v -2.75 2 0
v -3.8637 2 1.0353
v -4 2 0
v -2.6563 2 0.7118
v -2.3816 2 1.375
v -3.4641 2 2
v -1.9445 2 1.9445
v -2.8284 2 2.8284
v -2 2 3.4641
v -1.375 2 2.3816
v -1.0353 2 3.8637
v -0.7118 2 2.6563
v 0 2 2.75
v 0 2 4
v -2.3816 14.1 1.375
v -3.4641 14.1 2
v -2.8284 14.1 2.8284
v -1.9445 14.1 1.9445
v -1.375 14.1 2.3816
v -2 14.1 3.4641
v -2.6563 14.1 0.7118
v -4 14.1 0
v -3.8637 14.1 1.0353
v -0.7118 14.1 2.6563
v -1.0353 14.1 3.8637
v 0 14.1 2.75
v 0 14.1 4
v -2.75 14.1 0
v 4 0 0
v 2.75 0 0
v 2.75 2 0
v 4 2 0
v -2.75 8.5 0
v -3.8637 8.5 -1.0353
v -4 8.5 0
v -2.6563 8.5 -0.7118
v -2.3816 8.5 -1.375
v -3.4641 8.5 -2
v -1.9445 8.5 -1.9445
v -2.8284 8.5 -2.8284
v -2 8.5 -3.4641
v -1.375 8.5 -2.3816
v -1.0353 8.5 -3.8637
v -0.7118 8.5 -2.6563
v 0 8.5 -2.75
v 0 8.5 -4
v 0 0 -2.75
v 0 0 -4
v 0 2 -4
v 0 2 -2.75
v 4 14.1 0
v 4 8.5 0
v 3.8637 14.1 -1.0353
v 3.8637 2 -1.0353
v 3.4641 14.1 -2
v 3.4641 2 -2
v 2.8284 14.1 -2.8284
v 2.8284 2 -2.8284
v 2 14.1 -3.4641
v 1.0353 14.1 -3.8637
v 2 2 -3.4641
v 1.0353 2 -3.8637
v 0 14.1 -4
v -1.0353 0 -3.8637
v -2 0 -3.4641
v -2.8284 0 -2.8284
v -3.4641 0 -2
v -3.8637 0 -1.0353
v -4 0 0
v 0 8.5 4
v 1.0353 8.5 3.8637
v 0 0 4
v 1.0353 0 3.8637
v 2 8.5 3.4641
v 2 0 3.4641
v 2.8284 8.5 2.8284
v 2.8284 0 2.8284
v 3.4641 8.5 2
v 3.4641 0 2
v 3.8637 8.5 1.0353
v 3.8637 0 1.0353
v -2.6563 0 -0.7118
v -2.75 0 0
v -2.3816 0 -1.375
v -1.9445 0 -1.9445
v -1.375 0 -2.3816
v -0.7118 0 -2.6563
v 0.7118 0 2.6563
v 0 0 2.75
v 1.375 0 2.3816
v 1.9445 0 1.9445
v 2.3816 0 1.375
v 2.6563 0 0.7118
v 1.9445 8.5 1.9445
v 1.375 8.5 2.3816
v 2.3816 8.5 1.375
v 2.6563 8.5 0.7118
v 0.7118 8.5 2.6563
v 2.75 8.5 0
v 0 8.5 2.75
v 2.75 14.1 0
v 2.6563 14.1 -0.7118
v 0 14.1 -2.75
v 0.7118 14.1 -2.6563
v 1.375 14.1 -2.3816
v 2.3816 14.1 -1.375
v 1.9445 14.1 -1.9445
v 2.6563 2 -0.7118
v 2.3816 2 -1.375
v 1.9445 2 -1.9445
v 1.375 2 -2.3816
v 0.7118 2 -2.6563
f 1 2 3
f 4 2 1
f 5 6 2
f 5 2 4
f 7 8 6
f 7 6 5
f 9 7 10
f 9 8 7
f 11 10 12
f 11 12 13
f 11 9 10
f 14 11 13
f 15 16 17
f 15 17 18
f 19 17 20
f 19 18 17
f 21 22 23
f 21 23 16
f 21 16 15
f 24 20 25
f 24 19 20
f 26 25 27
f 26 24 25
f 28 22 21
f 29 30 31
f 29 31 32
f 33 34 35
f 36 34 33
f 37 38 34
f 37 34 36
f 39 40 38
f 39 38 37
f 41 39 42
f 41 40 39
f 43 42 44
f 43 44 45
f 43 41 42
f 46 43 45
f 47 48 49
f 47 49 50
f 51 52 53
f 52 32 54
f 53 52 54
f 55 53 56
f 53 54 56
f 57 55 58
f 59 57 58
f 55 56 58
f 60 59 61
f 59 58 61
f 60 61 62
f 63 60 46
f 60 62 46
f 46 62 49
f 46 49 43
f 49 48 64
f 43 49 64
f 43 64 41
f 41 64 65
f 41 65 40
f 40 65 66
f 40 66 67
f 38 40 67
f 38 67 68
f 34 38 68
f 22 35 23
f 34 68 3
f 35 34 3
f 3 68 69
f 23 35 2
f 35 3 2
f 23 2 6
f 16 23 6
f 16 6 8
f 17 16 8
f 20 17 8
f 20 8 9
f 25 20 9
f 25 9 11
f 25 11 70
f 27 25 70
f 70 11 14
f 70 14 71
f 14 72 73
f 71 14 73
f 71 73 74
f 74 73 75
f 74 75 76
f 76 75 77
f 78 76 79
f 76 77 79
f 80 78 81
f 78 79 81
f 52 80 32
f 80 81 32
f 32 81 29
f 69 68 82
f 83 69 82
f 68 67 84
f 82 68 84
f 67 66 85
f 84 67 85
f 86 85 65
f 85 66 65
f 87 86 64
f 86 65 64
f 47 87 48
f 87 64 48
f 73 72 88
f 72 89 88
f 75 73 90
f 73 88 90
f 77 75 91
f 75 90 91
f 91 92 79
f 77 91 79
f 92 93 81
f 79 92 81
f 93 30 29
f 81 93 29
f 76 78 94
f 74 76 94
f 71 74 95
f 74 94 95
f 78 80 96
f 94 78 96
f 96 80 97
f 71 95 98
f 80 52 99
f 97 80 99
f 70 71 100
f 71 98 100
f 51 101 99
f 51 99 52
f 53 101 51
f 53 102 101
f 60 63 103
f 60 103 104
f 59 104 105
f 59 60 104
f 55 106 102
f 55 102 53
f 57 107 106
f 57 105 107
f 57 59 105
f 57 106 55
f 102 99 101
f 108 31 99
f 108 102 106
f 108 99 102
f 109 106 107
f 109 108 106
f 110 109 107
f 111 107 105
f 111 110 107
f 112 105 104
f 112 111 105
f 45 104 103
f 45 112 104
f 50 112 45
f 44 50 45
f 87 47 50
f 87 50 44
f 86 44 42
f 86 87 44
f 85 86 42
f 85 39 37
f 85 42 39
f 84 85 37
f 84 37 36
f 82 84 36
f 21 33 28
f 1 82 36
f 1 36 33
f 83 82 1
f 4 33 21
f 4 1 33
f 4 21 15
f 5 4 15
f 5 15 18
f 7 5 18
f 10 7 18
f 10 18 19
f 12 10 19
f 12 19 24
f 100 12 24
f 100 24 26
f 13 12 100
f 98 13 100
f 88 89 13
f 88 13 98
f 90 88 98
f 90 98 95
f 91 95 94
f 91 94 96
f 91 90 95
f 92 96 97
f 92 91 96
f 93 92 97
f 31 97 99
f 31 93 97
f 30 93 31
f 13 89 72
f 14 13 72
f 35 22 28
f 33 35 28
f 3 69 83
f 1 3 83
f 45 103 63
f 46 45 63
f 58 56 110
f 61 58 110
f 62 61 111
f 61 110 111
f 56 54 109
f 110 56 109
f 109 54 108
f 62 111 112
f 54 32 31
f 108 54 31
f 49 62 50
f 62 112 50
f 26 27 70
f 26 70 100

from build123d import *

# Parameters (mm, degrees)
SCHIZZO1_R                   = 4
SCHIZZO1_R_2                 = 2.75
ESTRUSIONE_ESTRUSIONE2_DEPTH = 14.1
TAGLIO_ESTRUSIONE1_DEPTH     = 5.6
TAGLIO_ESTRUSIONE2_DEPTH     = 2


with BuildPart() as part:
    # Schizzo1 → Estrusione-Estrusione2 (new body)
    with BuildSketch(Plane(origin=(0, 0, 0), x_dir=(1, 0, 0), z_dir=(0, 1, 0))):
        Circle(SCHIZZO1_R)
        Circle(SCHIZZO1_R_2, mode=Mode.SUBTRACT)
    extrude(amount=ESTRUSIONE_ESTRUSIONE2_DEPTH)

    # Schizzo2 → Taglio-Estrusione1 (cut)
    with BuildSketch(Plane(origin=(0, 14.1, 0), x_dir=(1, 0, 0), z_dir=(0, 1, 0))):
        with BuildLine():
            Line((0, 2.75), (0, 4))
            ThreePointArc((0, 4), (-2.828427125, 2.828427125), (-4, 0))
            Line((-4, 0), (-2.75, 0))
            ThreePointArc((-2.75, 0), (-1.944543648, 1.944543648), (0, 2.75))
        make_face()
        with BuildLine():
            Line((2.75, 0), (4, 0))
            ThreePointArc((4, 0), (2.828427125, -2.828427125), (0, -4))
            Line((0, -4), (0, -2.75))
            ThreePointArc((0, -2.75), (1.944543648, -1.944543648), (2.75, 0))
        make_face()
    extrude(amount=-TAGLIO_ESTRUSIONE1_DEPTH, mode=Mode.SUBTRACT)

    # Schizzo3 → Taglio-Estrusione2 (cut)
    with BuildSketch(Plane.XZ):
        with BuildLine():
            Line((0, 2.75), (0, 4))
            ThreePointArc((0, 4), (-2.828427125, 2.828427125), (-4, 0))
            Line((-4, 0), (-2.75, 0))
            ThreePointArc((-2.75, 0), (-1.944543648, 1.944543648), (0, 2.75))
        make_face()
        with BuildLine():
            Line((2.75, 0), (4, 0))
            ThreePointArc((4, 0), (2.828427125, -2.828427125), (0, -4))
            Line((0, -4), (0, -2.75))
            ThreePointArc((0, -2.75), (1.944543648, -1.944543648), (2.75, 0))
        make_face()
    extrude(amount=-TAGLIO_ESTRUSIONE2_DEPTH, mode=Mode.SUBTRACT)


solid = part.part
